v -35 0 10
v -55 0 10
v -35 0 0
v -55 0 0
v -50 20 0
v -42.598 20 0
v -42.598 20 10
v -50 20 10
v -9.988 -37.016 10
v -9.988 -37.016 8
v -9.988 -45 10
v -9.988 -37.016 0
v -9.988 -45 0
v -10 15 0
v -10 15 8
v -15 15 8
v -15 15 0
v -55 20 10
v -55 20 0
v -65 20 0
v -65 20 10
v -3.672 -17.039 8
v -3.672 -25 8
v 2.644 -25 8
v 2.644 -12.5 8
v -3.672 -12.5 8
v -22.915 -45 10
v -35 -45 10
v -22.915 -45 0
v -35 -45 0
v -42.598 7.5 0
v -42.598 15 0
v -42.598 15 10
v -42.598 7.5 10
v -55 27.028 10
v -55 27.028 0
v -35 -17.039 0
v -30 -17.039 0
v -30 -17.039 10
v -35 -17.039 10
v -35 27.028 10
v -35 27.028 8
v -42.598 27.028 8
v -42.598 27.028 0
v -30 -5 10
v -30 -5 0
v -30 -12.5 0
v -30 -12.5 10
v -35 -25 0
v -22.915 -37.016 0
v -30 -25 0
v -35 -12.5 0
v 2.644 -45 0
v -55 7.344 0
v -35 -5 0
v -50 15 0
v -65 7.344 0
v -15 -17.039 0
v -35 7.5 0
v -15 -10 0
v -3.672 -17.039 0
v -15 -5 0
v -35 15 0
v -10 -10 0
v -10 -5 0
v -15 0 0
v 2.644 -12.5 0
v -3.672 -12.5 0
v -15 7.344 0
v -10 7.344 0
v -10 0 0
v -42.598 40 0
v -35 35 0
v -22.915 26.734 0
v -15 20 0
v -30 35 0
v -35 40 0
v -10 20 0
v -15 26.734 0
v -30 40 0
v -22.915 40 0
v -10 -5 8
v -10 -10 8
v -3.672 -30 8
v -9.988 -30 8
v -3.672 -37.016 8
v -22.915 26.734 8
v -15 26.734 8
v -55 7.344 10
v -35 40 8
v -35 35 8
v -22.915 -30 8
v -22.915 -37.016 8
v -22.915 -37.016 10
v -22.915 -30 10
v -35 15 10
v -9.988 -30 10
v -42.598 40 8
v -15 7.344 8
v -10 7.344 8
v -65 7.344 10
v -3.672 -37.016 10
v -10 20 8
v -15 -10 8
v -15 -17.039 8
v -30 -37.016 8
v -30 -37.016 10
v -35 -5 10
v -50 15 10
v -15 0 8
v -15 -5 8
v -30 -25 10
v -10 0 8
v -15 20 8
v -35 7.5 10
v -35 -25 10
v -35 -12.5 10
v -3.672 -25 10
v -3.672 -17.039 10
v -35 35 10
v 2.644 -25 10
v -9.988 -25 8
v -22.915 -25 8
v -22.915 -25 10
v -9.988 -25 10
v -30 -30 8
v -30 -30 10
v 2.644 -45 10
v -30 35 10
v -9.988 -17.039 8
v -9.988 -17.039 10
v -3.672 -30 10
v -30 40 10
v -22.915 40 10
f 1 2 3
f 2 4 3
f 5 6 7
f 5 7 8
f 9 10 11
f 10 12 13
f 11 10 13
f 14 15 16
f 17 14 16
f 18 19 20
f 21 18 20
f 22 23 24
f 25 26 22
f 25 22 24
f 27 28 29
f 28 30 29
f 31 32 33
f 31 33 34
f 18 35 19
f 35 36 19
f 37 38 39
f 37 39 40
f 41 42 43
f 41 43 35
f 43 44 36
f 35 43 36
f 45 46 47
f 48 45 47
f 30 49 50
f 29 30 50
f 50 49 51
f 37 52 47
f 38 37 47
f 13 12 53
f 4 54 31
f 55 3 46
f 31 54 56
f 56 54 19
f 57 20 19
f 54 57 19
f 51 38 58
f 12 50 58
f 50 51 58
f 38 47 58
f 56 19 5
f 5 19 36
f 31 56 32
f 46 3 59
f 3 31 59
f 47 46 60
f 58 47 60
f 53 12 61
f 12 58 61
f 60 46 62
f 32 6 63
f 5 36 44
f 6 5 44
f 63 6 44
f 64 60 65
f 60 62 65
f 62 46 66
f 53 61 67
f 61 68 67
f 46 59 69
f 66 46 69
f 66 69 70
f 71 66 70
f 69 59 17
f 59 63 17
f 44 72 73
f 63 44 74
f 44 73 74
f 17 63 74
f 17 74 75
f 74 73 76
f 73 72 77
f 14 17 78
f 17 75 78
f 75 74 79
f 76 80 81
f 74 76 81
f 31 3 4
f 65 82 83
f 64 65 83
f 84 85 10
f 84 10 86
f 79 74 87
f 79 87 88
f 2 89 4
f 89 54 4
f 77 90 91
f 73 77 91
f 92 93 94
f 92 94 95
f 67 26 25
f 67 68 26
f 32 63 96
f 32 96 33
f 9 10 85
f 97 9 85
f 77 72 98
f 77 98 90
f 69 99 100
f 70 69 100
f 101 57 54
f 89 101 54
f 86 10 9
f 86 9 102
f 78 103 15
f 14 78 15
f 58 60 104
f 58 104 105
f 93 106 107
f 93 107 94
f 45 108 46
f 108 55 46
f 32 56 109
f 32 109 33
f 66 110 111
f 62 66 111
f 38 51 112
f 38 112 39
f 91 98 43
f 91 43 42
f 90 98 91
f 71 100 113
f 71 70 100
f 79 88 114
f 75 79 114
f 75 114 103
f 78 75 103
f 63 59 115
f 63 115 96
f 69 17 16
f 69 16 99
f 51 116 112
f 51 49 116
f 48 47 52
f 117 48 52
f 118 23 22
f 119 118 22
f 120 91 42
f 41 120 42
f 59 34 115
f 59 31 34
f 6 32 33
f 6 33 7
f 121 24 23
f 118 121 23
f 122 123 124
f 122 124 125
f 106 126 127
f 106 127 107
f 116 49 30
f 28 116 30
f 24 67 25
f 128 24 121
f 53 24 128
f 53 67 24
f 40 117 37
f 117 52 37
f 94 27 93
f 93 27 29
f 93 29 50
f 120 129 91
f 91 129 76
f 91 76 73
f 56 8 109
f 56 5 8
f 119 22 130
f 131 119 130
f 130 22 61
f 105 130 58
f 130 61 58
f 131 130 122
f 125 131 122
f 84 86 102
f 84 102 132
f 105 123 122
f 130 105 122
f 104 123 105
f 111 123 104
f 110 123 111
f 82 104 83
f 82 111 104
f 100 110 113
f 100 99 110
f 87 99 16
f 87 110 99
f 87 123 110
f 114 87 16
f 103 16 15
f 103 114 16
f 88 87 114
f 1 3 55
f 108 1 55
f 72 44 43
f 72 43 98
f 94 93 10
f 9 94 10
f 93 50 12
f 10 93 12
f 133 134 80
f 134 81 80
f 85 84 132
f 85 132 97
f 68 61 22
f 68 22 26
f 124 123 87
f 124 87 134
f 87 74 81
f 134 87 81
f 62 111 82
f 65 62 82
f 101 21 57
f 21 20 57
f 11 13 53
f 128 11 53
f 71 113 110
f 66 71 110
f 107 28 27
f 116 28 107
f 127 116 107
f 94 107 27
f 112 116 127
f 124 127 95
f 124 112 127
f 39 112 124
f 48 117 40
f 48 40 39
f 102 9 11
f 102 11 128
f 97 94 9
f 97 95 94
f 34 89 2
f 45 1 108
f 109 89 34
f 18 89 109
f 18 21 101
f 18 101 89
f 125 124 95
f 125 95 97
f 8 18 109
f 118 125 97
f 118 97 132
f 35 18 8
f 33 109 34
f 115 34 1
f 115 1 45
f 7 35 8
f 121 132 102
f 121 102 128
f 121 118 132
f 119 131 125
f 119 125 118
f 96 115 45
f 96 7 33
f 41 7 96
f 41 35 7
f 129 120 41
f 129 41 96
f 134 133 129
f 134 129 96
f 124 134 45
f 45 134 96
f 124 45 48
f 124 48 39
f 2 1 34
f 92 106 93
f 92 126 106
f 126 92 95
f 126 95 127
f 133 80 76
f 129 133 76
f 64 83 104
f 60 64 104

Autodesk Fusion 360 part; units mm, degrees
sketch "giraffe" plane through (0, 0, 0) normal (0, 0, 1) x (1, 0, 0)
  line L0 (-42.5977, 27.0275) -> (-55, 27.0275)
  line L1 (-55, 27.0275) -> (-55, 20)
  line L2 (-55, 20) -> (-65, 20)
  line L3 (-65, 20) -> (-65, 7.3444)
  line L4 (-65, 7.3444) -> (-55, 7.3444)
  line L5 (-55, 7.3444) -> (-55, 0)
  line L6 (-55, 0) -> (-35, 0)
  line L7 (-35, 0) -> (-35, -45)
  line L8 (-35, -45) -> (-22.9146, -45)
  line L9 (-22.9146, -45) -> (-22.9146, -37.0159)
  line L10 (-9.9884, -37.0159) -> (-9.9884, -45)
  line L11 (-9.9884, -45) -> (2.644, -45)
  line L12 (2.644, -45) -> (2.644, -25)
  line L13 (2.644, -25) -> (-3.6722, -25)
  line L14 (-3.6722, -25) -> (-3.6722, -17.0391)
  line L15 (-3.6722, -17.0391) -> (-9.9884, -17.0391)
  line L16 (-9.9884, -17.0391) -> (-9.9884, -25)
  line L17 (-22.9146, -25) -> (-22.9146, 40)
  line L18 (-22.9146, 40) -> (-30, 40)
  line L19 (-30, 40) -> (-30, 35)
  line L20 (-30, 35) -> (-35, 35)
  line L21 (-35, 35) -> (-35, 27.0275)
  line L22 (-35, 27.0275) -> (-42.5977, 27.0275)
  line L23 (-42.5977, 27.0275) -> (-42.5977, 40)
  line L24 (-42.5977, 40) -> (-35, 40)
  line L25 (-35, 40) -> (-35, 35)
  line L26 (-22.9146, 26.7337) -> (-15, 26.7337)
  line L27 (-15, 26.7337) -> (-15, 20)
  line L28 (-15, 20) -> (-10, 20)
  line L29 (-10, 20) -> (-10, 15)
  line L30 (-10, 15) -> (-15, 15)
  line L31 (-15, 15) -> (-15, 7.3444)
  line L32 (-15, 7.3444) -> (-10, 7.3444)
  line L33 (-10, 7.3444) -> (-10, 0)
  line L34 (-10, 0) -> (-15, 0)
  line L35 (-15, 0) -> (-15, -5)
  line L36 (-15, -5) -> (-10, -5)
  line L37 (-10, -5) -> (-10, -10)
  line L38 (-10, -10) -> (-15, -10)
  line L39 (-15, -10) -> (-15, -15)
  line L40 (-15, -15) -> (-15, -17.0391)
  line L41 (-15, -17.0391) -> (-9.9884, -17.0391)
  line L42 (-3.6722, -17.0391) -> (-3.6722, -12.5)
  line L43 (-3.6722, -12.5) -> (0, -12.5)
  line L44 (0, -12.5) -> (2.644, -12.5)
  line L45 (2.644, -12.5) -> (2.644, -25)
  line L46 (-35, -5) -> (-30, -5)
  line L47 (-30, -5) -> (-30, -12.5)
  line L48 (-30, -12.5) -> (-35, -12.5)
  line L49 (-30, -30) -> (-30, -37.0159)
  line L50 (-30, -37.0159) -> (-22.9146, -37.0159)
  line L51 (-22.9146, -37.0159) -> (-22.9146, -30)
  line L52 (-22.9146, -30) -> (-30, -30)
  line L53 (-9.9884, -37.0159) -> (-9.9884, -30)
  line L54 (-9.9884, -37.0159) -> (-3.6722, -37.0159)
  line L55 (-3.6722, -37.0159) -> (-3.6722, -30)
  line L56 (-3.6722, -30) -> (-9.9884, -30)
  line L57 (-42.5977, 7.5) -> (-35, 7.5)
  line L58 (-35, 7.5) -> (-35, 15)
  line L59 (-35, 15) -> (-42.5977, 15)
  line L60 (-42.5977, 15) -> (-42.5977, 7.5)
  line L61 (-42.5977, 15) -> (-42.5977, 20)
  line L62 (-42.5977, 20) -> (-50, 20)
  line L63 (-50, 20) -> (-50, 15)
  line L64 (-50, 15) -> (-42.5977, 15)
  line L65 (-35, -25) -> (-30, -25)
  line L66 (-30, -25) -> (-30, -17.0391)
  line L67 (-30, -17.0391) -> (-35, -17.0391)
  line L68 (-22.9146, -25) -> (-9.9884, -25)
  line L69 (-22.9146, -37.0159) -> (-9.9884, -37.0159)
extrude "Extrude1" add sketch "giraffe" along normal blind 10 contours L0 L1 L2 L3 L4 L5 L6 L7 L8 L9 L10 L11 L12 L13 L14 L15 L16 L17 L18 L19 L20 L21 L22 L46 L47 L48 L65 L66 L67 L68 L69 makes body 1
extrude "Extrude2" add sketch "giraffe" along normal blind 8 separate body contours L49 L50 L51 L52 | L53 L54 L55 L56 | L21 L22 L23 L24 L25 | L16 L17 L26 L27 L28 L29 L30 L31 L32 L33 L34 L35 L36 L37 L38 L39 L40 L41 L68 | L13 L14 L42 L43 L44 L45 makes body 2 at (-42.5977, 31.3517, 5.3333) makes body 3 at (-20.2764, 0.5779, 0) makes body 4 at (-27.6382, -37.0159, 2.6667) makes body 5 at (-3.6722, -20.8333, 5.3333) makes body 6 at (-9.9884, -34.6773, 2.6667)
combine "Combine1" operation add target body 5 tool bodies 2 3 1 6 4
